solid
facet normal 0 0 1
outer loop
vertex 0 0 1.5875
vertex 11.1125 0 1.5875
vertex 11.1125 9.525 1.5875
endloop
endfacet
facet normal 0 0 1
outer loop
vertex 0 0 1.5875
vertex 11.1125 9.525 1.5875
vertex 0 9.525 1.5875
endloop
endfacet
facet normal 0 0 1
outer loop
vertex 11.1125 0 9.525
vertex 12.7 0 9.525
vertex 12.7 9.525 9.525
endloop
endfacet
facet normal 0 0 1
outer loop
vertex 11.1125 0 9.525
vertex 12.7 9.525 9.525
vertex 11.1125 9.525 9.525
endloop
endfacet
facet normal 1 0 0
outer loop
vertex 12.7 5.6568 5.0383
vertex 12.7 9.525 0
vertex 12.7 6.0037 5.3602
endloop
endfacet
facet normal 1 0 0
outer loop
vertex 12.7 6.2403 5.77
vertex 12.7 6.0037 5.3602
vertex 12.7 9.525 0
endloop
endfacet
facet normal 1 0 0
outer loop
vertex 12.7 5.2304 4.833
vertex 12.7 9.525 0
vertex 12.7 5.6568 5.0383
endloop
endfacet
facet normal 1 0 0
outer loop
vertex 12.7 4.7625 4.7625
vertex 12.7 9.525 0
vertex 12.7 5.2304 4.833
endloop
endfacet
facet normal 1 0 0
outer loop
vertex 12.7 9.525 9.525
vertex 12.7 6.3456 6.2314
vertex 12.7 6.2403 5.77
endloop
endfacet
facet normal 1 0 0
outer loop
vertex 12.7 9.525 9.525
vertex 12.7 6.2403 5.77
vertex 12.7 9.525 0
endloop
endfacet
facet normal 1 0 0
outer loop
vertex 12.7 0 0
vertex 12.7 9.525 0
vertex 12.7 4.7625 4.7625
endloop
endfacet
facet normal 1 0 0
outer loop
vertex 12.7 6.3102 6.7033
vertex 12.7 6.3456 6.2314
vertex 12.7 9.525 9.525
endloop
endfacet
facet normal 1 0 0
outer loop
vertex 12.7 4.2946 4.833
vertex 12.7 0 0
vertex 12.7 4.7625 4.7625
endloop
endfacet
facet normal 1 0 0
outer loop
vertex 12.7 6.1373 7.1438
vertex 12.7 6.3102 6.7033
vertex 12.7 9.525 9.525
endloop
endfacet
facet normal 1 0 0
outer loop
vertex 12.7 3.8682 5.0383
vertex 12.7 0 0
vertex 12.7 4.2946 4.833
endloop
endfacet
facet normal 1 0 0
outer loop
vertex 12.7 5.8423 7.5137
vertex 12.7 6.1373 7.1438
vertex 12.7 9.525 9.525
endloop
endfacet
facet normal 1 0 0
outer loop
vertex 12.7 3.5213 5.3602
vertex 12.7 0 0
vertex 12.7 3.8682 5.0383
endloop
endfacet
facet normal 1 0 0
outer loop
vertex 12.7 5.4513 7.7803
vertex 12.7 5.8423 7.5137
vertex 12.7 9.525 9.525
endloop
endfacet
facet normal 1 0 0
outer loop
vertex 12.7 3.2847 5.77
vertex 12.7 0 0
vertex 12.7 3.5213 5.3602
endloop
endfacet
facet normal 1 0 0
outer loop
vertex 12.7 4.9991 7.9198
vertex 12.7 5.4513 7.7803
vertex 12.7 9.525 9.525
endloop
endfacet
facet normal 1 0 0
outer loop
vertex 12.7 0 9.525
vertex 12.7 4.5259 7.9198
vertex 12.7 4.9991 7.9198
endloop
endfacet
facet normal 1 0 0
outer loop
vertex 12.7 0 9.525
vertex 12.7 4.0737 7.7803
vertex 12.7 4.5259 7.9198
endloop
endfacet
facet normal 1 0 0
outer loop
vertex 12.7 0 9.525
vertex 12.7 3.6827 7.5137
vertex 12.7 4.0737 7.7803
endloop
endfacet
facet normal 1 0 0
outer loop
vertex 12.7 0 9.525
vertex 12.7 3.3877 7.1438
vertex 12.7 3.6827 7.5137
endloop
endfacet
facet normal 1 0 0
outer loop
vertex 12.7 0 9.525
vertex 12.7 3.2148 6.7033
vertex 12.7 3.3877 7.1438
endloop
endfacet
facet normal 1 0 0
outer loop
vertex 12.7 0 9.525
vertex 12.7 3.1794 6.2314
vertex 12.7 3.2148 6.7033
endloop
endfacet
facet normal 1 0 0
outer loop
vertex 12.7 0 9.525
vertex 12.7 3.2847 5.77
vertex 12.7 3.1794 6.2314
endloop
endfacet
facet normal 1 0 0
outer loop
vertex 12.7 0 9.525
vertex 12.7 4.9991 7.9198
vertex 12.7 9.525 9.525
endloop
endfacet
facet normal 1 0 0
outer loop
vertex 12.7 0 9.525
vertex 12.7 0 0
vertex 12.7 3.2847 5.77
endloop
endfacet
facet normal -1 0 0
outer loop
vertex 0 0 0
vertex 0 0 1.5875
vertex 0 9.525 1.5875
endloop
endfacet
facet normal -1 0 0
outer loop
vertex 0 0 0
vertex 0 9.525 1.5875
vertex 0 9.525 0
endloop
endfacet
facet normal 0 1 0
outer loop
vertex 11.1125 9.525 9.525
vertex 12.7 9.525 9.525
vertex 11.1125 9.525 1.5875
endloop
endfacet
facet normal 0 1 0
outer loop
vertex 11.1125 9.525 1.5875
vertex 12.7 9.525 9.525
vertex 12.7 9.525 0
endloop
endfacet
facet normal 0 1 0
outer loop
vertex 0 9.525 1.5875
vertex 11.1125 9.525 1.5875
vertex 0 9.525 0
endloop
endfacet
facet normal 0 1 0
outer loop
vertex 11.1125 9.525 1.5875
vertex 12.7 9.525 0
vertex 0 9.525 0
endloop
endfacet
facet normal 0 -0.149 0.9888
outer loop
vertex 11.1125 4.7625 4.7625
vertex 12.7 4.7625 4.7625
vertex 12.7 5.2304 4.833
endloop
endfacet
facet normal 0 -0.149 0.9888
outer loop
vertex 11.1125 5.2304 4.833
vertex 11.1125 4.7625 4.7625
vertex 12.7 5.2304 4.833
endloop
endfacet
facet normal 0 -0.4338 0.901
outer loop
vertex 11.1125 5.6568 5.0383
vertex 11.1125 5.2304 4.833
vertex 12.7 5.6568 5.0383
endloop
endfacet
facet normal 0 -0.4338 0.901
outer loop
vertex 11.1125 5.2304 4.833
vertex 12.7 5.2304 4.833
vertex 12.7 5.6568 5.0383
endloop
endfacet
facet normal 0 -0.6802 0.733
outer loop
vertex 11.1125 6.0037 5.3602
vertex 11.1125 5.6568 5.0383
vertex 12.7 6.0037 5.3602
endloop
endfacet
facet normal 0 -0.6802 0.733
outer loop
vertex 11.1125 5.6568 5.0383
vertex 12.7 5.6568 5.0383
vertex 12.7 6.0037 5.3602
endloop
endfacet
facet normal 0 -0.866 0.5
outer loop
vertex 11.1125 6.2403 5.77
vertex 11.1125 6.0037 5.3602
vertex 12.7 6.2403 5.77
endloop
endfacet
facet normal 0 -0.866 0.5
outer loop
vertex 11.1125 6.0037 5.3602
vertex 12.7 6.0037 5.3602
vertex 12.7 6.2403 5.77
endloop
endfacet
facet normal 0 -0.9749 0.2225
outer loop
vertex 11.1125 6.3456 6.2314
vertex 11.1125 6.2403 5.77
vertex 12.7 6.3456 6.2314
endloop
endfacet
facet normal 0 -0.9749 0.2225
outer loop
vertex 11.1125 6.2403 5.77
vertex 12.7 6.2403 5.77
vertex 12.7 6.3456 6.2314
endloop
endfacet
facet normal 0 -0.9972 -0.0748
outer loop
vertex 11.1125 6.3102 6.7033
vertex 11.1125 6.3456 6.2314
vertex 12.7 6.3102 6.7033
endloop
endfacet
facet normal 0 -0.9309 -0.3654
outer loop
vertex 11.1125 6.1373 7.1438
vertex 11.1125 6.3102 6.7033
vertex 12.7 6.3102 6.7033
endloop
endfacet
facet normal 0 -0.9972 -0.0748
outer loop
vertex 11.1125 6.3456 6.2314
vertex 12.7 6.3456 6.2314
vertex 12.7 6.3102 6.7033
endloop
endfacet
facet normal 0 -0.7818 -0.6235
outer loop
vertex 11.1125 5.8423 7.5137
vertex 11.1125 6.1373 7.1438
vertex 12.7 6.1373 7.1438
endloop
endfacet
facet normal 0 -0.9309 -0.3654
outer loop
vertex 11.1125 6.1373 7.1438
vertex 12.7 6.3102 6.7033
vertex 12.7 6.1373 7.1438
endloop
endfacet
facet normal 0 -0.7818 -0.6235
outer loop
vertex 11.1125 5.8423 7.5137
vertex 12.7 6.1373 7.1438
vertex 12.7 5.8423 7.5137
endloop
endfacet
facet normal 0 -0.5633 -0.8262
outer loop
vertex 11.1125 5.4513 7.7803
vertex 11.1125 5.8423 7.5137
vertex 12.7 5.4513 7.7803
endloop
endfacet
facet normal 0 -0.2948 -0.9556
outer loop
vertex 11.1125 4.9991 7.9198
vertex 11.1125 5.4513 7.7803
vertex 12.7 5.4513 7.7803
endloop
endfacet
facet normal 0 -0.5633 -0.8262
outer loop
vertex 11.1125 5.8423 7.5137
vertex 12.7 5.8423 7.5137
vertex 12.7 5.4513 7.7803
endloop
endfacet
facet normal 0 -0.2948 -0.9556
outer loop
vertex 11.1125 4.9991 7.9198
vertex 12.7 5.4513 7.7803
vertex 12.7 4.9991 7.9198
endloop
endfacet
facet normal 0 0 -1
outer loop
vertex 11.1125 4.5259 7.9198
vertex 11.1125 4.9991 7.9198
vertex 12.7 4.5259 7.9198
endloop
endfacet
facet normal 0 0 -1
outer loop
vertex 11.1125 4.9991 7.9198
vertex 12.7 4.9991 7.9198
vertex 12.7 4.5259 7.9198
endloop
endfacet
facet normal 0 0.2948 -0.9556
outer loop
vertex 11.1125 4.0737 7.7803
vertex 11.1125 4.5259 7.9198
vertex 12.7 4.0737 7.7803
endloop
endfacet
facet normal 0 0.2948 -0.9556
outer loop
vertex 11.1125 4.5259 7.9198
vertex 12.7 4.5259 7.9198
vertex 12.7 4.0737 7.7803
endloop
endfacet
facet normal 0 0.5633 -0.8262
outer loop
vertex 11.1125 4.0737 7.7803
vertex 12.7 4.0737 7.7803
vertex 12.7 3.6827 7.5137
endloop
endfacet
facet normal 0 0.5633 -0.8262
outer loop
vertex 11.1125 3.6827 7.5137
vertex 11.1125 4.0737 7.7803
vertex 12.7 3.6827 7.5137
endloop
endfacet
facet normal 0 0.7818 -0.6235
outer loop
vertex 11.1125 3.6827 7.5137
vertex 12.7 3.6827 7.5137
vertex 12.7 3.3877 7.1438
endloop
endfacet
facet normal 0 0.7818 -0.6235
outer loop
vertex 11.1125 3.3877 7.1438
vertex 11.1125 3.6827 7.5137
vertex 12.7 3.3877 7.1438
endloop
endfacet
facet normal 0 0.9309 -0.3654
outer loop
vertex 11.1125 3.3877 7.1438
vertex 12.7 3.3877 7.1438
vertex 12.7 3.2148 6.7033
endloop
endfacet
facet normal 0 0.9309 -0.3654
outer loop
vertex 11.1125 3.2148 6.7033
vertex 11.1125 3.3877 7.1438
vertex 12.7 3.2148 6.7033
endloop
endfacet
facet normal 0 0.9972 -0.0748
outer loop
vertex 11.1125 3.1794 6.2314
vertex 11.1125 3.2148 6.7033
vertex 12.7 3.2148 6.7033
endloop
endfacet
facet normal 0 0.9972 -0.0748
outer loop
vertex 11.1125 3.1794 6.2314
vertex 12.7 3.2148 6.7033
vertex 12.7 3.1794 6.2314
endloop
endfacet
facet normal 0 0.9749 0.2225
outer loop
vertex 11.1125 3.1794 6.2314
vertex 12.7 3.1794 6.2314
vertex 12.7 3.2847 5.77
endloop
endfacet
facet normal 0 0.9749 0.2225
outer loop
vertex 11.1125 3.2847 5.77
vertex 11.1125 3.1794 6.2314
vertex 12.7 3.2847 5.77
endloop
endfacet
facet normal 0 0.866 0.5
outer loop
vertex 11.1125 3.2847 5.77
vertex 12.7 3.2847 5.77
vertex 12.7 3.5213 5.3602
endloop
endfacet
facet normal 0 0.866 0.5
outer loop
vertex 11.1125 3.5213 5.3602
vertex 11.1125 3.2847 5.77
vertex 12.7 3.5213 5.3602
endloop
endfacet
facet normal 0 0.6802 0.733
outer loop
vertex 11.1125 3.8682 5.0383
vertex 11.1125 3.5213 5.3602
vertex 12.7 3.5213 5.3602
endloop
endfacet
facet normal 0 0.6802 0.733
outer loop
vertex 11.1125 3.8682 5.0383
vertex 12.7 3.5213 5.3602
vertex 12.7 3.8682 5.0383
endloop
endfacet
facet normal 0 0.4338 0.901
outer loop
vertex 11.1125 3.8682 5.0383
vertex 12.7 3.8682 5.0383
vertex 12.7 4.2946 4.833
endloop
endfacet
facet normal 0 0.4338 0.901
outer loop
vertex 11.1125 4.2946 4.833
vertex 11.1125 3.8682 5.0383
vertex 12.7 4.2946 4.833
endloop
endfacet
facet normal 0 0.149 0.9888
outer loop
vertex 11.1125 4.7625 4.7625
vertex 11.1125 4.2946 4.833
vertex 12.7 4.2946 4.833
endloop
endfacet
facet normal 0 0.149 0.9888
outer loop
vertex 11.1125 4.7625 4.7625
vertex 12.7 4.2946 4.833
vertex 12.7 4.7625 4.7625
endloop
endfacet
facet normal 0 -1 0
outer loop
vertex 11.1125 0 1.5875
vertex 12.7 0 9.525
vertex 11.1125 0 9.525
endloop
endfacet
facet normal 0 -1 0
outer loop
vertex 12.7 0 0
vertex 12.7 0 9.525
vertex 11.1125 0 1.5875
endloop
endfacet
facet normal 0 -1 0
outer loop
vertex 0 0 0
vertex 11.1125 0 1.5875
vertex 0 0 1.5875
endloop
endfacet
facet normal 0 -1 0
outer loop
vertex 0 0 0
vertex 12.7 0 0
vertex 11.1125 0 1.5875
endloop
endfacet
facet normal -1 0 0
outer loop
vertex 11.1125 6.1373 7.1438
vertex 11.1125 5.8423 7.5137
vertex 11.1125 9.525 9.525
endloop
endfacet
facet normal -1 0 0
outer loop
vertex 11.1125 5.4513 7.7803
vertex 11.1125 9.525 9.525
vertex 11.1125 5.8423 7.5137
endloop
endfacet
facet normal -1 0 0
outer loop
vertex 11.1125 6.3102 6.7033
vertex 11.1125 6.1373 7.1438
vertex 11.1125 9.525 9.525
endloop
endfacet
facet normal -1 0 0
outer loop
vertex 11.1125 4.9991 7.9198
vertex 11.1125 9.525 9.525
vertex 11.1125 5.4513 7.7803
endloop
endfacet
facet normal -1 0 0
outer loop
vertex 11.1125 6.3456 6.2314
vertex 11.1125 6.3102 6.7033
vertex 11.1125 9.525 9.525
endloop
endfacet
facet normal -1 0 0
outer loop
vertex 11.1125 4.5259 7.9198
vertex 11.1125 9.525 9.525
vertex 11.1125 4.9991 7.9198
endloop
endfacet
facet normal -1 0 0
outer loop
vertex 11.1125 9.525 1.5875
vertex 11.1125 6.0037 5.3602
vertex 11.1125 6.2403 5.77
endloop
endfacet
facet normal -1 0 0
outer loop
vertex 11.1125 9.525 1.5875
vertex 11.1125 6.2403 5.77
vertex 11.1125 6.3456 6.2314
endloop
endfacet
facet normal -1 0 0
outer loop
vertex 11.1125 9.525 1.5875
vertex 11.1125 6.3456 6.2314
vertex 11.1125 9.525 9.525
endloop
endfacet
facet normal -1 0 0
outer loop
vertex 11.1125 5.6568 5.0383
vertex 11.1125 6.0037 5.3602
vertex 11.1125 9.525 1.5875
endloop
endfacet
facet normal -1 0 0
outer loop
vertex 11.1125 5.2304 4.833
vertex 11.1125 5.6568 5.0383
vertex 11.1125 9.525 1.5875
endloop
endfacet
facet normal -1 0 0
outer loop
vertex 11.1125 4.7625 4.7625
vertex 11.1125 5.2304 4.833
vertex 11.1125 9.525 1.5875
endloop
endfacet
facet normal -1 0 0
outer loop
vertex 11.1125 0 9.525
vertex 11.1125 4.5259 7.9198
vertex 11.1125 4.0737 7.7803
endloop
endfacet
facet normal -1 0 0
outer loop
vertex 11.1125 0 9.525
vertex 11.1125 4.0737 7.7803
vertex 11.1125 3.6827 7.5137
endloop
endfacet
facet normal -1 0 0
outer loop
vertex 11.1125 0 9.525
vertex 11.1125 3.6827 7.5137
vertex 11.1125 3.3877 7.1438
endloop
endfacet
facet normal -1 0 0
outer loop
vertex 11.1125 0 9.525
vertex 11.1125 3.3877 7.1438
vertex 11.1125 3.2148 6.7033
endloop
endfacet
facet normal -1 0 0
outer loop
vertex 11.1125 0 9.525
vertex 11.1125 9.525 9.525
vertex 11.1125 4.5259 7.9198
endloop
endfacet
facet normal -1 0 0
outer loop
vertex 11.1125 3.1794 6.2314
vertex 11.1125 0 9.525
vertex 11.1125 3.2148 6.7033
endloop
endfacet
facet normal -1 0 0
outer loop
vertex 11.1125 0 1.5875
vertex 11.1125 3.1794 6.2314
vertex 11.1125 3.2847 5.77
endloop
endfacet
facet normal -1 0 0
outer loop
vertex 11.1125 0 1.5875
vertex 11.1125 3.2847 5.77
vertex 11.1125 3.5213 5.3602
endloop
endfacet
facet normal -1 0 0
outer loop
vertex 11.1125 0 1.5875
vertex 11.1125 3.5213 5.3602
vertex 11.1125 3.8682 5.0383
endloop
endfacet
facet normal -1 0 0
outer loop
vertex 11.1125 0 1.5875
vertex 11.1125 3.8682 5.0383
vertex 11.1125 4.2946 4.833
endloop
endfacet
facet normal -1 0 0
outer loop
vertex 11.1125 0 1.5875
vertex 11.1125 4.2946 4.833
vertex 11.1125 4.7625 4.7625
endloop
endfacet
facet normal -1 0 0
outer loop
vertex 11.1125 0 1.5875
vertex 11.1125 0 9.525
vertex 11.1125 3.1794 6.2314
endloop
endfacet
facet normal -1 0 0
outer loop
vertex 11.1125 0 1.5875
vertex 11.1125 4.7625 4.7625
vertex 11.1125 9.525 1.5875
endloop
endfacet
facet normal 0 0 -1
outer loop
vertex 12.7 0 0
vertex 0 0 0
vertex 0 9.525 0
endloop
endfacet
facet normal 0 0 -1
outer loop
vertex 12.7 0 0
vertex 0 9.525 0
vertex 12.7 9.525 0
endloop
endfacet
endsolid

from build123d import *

# Parameters (mm, degrees)
BOSS_EXTRUDE1_DEPTH          = 9.525
F_1_8_0_125_DIAMETER_HOLE1_D = 3.175


with BuildPart() as part:
    # Sketch1 → Boss-Extrude1 (new body)
    with BuildSketch(Plane(origin=(0, 0, 0), x_dir=(1, 0, 0), z_dir=(0, 1, 0))):
        Polygon((0, 0), (12.7, 0), (12.7, -9.525), (11.1125, -9.525), (11.1125, -1.5875), (0, -1.5875), align=None)
    extrude(amount=BOSS_EXTRUDE1_DEPTH)

    # 1/8 (0.125) Diameter Hole1 (through all)
    with Locations(Plane.ZY.offset(-11.1125)):
        with Locations((6.35, 4.7625)):
            Hole(F_1_8_0_125_DIAMETER_HOLE1_D / 2)


solid = part.part
